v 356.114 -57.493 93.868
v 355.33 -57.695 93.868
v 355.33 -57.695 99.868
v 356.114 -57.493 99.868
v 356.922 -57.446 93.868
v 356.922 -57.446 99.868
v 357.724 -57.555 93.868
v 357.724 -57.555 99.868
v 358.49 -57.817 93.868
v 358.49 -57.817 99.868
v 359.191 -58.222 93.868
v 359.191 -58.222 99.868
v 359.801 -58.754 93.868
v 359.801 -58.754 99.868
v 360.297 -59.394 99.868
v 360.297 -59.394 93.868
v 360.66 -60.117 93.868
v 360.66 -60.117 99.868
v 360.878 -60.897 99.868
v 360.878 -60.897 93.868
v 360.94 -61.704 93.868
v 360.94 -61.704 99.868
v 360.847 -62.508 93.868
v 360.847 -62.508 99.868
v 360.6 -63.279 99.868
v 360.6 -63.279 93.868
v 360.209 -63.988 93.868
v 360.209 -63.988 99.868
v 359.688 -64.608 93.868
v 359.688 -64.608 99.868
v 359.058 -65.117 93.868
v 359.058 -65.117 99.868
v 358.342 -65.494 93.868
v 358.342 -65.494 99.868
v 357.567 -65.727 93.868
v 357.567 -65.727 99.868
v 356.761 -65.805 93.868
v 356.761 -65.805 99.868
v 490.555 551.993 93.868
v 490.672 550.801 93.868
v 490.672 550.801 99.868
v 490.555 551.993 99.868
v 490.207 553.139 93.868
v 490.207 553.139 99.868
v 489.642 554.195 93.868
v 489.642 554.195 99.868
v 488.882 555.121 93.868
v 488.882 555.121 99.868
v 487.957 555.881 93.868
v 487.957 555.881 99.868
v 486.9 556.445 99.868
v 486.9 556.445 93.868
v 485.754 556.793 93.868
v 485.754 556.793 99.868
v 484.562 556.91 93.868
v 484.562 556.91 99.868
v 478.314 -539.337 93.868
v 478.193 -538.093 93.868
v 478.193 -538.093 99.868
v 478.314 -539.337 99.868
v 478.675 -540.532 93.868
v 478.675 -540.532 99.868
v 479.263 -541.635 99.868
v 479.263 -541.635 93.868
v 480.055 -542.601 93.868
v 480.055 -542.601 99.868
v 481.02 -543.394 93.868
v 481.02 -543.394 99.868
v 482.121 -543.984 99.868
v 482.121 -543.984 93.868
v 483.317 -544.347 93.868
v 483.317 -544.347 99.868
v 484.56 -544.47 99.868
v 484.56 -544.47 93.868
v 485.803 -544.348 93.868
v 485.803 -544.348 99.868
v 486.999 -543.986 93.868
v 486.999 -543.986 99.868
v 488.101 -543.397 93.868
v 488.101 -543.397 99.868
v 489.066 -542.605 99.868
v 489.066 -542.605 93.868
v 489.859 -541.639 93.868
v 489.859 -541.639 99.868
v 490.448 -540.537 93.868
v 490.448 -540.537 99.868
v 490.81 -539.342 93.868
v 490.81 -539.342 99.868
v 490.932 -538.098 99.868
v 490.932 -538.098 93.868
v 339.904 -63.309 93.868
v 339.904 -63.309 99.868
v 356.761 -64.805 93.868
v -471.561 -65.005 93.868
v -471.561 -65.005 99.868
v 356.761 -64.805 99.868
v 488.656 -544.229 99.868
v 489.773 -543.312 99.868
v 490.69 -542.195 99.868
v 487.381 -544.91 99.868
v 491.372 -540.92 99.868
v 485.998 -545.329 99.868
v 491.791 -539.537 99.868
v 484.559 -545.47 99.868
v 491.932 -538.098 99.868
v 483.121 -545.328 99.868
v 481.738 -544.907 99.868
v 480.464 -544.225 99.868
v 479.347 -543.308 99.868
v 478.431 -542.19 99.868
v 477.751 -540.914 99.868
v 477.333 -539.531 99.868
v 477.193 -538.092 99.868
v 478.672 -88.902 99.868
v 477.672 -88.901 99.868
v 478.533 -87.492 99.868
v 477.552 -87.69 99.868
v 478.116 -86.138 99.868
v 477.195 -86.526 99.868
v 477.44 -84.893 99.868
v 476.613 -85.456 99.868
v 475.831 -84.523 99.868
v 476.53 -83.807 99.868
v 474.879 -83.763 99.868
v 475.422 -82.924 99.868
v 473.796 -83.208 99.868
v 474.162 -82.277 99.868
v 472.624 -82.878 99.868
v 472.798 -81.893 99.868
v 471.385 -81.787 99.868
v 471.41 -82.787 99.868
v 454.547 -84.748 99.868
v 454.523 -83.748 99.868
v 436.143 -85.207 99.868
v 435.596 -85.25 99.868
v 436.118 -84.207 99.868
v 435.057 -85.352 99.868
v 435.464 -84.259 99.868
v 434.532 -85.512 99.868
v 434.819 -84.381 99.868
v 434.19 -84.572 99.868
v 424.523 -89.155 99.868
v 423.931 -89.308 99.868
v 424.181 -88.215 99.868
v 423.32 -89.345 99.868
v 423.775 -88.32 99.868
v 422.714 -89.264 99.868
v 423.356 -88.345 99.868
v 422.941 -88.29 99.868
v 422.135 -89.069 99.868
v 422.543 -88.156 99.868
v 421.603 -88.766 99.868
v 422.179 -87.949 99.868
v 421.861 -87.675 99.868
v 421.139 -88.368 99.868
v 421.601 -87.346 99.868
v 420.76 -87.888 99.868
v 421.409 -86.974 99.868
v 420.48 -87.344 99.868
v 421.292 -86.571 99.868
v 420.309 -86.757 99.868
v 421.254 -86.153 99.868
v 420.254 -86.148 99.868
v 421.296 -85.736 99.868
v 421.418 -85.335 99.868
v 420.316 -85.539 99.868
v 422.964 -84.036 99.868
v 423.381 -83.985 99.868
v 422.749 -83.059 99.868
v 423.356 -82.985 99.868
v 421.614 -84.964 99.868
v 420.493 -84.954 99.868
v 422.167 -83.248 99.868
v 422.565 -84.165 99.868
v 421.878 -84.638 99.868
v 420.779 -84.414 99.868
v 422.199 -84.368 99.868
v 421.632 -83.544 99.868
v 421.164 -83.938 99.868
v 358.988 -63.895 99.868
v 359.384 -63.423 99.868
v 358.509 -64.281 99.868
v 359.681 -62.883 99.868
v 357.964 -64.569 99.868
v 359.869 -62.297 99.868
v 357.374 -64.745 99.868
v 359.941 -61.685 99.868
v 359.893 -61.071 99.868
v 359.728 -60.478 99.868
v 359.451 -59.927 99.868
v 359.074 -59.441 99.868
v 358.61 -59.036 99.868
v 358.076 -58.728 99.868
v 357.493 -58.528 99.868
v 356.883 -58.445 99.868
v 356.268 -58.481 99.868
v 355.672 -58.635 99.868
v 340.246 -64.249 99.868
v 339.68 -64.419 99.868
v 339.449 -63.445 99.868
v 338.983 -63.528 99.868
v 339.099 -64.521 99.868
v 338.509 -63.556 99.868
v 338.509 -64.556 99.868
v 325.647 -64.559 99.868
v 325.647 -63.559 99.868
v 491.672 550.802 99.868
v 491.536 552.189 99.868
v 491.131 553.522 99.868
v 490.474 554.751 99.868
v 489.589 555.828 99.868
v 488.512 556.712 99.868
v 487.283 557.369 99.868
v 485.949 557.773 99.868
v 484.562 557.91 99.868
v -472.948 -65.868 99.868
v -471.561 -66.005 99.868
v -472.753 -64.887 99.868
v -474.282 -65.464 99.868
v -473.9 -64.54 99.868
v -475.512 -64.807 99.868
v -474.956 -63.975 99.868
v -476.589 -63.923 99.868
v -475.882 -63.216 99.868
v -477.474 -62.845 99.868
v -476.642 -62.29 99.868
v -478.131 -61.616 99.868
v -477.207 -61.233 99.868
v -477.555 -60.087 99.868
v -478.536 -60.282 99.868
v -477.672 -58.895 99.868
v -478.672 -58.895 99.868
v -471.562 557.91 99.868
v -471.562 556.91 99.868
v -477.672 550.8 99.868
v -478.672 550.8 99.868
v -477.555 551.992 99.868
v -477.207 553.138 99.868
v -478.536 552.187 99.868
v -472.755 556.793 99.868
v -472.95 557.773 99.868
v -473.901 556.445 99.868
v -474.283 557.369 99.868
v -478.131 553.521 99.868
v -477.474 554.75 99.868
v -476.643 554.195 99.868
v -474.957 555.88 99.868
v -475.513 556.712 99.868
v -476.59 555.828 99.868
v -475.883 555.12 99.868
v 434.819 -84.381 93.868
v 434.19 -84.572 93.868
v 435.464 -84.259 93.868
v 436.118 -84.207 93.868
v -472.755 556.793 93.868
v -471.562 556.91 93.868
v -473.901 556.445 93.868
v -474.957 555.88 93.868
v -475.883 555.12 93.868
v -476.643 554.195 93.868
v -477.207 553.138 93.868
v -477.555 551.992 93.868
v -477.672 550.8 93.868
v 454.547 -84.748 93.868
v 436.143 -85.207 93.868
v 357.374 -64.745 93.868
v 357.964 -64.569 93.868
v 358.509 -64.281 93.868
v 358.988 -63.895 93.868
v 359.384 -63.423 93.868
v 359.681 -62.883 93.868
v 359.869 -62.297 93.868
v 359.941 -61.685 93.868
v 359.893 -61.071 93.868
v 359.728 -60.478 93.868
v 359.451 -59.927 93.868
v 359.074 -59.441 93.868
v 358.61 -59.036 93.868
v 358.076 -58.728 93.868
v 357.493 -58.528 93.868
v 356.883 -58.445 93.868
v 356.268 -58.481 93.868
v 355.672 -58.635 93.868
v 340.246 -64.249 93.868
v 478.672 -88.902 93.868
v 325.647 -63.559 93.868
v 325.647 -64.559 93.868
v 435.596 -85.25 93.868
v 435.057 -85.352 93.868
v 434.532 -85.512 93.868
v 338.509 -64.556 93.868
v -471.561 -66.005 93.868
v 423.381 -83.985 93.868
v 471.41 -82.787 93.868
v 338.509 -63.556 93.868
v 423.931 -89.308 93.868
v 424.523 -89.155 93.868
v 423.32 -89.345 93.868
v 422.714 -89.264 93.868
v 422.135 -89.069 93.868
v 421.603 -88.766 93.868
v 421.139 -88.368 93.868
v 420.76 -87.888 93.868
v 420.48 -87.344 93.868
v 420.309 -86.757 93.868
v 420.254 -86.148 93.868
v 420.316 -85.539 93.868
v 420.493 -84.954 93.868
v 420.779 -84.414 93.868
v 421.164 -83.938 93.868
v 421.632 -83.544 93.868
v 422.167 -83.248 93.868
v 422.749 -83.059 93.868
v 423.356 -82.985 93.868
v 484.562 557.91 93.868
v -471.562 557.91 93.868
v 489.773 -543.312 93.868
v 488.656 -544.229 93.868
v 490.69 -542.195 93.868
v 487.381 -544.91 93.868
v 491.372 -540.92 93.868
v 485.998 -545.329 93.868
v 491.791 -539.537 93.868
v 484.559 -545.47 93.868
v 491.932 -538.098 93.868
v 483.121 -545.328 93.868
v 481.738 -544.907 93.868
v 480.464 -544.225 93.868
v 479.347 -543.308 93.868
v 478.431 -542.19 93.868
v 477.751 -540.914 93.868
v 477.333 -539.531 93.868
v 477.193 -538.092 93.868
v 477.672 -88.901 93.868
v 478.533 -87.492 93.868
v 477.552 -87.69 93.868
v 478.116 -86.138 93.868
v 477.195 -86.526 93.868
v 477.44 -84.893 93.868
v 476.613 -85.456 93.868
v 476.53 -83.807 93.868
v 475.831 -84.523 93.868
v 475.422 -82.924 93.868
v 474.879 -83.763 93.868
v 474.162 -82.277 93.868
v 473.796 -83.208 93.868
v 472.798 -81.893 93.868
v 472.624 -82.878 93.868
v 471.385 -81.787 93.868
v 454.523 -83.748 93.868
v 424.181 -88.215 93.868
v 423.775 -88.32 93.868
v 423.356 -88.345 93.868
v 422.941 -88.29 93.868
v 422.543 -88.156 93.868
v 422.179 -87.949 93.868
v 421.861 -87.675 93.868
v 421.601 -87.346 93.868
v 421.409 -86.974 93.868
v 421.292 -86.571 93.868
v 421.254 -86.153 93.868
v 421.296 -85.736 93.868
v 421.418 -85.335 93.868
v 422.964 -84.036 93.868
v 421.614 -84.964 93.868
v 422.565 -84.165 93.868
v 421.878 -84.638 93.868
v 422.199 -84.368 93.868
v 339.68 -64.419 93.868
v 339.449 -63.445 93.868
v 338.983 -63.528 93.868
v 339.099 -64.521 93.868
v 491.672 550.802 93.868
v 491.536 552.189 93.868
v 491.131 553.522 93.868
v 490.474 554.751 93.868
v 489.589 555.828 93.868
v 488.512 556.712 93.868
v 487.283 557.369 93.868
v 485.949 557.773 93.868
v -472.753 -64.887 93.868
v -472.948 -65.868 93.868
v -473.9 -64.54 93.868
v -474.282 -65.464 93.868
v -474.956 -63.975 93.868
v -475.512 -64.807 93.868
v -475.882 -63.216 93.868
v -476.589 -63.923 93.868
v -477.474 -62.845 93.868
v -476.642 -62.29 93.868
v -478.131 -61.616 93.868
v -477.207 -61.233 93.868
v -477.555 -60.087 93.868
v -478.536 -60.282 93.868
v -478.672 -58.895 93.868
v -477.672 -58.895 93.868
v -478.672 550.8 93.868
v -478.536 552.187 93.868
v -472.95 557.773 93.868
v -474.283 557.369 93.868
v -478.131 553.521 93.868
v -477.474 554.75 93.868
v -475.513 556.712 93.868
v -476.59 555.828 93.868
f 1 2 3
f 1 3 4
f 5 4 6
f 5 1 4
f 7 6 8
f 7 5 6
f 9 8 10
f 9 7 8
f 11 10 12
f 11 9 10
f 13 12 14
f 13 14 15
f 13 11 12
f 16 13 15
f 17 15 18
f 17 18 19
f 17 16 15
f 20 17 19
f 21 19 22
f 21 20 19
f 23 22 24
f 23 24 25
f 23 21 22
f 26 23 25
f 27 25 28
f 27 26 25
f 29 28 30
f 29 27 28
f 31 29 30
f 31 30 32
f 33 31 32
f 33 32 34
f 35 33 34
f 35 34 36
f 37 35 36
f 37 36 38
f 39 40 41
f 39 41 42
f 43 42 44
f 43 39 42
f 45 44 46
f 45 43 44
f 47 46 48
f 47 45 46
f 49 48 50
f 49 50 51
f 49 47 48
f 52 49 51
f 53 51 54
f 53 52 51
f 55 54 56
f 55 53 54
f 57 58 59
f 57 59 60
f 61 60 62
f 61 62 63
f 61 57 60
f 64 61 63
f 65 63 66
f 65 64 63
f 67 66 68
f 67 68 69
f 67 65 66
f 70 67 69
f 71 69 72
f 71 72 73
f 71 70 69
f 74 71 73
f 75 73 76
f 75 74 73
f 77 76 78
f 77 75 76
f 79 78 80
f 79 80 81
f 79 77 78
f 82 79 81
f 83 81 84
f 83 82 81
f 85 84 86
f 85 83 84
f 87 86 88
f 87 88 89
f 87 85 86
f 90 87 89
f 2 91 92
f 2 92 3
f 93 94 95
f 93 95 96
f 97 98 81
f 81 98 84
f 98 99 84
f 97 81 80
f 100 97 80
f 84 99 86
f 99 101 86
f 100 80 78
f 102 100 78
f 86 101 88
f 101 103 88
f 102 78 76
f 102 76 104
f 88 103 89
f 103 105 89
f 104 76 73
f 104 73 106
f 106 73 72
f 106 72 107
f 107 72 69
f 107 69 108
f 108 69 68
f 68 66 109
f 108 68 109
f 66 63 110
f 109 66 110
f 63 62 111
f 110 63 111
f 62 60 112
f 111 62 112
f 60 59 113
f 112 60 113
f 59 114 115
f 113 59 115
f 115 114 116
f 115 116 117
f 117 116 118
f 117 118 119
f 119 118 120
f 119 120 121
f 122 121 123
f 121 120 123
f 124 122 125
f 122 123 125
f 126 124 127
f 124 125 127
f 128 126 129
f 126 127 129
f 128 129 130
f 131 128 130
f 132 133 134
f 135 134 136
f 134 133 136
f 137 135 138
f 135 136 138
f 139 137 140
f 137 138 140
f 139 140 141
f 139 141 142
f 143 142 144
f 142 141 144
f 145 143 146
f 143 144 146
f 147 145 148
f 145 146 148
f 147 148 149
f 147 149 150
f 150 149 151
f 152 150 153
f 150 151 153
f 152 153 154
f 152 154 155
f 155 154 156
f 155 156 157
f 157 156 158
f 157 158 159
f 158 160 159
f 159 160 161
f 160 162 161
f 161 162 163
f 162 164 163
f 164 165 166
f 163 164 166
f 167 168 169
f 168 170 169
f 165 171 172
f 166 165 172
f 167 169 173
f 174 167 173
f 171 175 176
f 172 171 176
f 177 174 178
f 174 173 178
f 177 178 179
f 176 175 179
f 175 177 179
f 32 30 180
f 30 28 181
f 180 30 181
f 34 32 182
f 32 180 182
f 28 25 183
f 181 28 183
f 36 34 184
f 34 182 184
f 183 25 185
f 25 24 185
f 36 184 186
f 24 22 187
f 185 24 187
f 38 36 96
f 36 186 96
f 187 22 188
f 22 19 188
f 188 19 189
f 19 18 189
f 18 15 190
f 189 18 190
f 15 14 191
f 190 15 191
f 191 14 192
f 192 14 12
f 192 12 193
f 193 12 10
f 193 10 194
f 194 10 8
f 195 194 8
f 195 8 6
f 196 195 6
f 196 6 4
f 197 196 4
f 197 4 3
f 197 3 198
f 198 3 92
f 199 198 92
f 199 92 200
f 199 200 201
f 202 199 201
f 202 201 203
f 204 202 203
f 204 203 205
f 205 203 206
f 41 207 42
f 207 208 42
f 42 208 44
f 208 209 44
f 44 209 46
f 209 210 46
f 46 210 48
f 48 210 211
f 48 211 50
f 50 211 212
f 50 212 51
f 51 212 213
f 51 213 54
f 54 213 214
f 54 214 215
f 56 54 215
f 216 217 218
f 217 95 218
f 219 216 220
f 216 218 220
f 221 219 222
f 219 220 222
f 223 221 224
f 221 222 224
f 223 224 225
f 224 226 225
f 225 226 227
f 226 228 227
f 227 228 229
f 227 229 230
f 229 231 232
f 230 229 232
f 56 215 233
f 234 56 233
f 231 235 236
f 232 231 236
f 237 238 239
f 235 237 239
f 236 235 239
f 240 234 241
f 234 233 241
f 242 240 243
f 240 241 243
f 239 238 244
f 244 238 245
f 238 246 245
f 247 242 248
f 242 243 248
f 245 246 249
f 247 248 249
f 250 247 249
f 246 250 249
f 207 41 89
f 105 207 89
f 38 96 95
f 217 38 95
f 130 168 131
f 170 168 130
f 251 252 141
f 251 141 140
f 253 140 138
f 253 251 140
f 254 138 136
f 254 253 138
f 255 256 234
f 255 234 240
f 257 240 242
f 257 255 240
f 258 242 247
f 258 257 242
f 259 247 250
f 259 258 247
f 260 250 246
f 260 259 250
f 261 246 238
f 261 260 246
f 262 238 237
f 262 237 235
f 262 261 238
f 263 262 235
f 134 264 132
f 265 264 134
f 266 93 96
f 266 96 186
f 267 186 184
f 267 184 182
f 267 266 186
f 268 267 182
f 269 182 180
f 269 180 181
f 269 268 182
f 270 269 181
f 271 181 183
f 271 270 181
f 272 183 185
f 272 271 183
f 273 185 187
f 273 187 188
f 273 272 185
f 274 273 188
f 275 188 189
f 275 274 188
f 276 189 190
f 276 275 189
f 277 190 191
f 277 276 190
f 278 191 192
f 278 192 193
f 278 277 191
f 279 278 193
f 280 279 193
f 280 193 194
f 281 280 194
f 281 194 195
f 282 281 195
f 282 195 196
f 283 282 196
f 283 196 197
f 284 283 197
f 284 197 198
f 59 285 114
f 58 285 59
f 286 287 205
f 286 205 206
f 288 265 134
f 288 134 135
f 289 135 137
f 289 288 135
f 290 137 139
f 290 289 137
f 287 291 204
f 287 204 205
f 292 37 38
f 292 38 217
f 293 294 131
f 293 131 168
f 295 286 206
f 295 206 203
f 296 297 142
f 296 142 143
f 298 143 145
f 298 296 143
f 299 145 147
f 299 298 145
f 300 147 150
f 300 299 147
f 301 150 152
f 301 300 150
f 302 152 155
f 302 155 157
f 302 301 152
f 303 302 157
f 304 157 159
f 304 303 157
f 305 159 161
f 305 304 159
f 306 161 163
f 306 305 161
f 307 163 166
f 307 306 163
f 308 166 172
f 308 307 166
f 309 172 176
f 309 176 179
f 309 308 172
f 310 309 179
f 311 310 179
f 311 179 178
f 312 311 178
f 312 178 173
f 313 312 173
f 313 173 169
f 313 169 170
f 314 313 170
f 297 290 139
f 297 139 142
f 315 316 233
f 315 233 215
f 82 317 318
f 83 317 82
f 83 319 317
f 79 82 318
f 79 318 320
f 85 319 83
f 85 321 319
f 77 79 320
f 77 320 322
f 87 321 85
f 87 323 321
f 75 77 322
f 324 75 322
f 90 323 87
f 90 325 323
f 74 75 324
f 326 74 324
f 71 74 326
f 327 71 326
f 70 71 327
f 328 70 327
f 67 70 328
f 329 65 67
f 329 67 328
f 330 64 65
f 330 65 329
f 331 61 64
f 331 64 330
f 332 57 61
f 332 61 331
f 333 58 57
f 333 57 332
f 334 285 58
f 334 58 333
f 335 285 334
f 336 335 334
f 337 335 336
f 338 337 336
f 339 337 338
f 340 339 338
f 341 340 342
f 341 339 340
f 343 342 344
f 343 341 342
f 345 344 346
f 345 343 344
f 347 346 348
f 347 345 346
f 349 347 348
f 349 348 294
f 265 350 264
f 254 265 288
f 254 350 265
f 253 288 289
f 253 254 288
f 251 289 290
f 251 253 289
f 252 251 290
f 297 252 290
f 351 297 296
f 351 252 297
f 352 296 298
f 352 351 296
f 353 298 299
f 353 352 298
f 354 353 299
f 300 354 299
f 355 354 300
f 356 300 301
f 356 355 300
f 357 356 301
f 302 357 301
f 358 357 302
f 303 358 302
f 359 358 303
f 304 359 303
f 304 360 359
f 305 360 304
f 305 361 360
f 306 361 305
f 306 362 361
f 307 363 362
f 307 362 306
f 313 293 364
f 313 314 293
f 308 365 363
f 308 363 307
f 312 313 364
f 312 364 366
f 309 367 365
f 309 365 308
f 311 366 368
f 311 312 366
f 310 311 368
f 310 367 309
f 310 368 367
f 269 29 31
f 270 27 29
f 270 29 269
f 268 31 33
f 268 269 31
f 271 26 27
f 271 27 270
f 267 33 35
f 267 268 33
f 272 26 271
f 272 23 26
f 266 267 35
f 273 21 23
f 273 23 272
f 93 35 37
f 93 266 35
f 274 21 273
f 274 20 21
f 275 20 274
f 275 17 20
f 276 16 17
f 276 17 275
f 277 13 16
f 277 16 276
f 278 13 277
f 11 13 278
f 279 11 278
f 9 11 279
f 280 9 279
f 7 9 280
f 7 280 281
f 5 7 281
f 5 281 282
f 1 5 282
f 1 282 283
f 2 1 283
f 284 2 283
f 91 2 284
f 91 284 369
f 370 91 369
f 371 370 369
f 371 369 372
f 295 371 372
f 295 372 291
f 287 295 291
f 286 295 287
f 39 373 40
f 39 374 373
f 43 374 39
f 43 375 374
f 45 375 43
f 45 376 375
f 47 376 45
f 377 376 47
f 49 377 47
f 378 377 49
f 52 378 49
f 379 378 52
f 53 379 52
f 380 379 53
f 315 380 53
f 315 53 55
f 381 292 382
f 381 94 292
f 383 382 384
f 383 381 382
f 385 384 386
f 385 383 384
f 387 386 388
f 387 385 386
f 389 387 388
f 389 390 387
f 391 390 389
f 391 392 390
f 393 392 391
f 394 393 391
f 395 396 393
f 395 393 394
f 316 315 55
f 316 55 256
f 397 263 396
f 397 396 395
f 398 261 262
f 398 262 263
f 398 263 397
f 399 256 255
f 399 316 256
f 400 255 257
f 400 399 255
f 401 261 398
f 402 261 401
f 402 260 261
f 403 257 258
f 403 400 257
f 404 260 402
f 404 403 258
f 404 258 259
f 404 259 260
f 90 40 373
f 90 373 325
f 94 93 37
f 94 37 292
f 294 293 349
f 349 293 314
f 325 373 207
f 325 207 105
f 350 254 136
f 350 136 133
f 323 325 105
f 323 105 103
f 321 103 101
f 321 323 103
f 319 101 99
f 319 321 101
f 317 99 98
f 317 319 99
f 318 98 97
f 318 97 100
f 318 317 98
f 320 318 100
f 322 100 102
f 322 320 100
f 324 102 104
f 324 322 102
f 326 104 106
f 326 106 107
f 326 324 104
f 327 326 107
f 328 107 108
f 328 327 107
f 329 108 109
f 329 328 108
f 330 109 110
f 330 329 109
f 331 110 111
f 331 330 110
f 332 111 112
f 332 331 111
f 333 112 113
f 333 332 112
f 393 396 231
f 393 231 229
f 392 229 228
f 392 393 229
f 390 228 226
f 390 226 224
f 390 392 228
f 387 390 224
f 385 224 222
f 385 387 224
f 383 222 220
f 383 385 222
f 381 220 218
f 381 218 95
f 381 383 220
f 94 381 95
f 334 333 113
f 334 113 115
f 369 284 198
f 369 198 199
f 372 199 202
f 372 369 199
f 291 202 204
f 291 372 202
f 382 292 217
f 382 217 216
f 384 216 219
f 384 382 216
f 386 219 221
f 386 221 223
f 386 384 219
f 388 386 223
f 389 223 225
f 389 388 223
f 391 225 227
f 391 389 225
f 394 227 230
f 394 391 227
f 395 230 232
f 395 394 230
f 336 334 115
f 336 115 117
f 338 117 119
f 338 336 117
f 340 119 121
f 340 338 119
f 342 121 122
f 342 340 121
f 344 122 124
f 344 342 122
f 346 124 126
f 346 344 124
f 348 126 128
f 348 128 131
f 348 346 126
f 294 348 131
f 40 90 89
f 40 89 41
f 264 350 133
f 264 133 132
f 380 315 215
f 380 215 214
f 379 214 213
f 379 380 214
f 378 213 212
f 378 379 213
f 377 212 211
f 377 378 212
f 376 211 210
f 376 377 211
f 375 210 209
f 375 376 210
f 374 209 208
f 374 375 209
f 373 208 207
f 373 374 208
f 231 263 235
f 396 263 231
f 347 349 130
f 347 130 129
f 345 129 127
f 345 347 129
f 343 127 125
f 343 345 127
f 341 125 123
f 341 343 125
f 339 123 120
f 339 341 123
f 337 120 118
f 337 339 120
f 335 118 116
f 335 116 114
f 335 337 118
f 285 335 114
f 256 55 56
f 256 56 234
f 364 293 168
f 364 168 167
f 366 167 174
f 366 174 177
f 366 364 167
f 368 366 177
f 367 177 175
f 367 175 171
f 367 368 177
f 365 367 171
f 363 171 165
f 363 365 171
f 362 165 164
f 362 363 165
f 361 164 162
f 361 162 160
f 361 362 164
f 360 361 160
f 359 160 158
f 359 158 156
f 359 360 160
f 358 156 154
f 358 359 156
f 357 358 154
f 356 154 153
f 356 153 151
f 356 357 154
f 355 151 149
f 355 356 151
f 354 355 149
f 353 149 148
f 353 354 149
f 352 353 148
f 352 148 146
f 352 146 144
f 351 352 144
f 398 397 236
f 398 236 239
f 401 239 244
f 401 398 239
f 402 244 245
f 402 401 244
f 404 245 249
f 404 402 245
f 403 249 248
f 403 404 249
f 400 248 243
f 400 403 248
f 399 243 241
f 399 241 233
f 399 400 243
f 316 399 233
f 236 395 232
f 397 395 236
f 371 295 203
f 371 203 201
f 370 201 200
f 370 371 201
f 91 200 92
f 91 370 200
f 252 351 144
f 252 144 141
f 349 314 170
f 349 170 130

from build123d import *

# Parameters (mm, degrees)
EXTRUDE_THIN4_DEPTH = 6


with BuildPart() as part:
    # Sketch1 → Extrude-Thin4 (new body)
    with BuildSketch(Plane.XY.offset(93.86849497)):
        with BuildLine():
            Line((454.547451712, -84.747722447), (436.143146619, -85.206883154))
            ThreePointArc((436.143146619, -85.206883154), (435.325389653, -85.293870004), (434.532383495, -85.511664405))
            Line((434.532383495, -85.511664405), (424.523003293, -89.154780862))
            ThreePointArc((424.523003293, -89.154780862), (420.309165105, -86.756830797), (423.355608829, -82.985123303))
            Line((423.355608829, -82.985123303), (471.385170996, -81.786855419))
            ThreePointArc((471.385170996, -81.786855419), (476.52965679, -83.807458497), (478.672495941, -88.902241246))
            Line((478.672495941, -88.902241246), (478.192503637, -538.093193208))
            ThreePointArc((478.192503637, -538.093193208), (484.559857096, -544.469999452), (490.932499818, -538.098479016))
            Line((490.932499818, -538.098479016), (490.672499826, 550.801458903))
            ThreePointArc((490.672499826, 550.801458903), (488.882406602, 555.120938203), (484.5625, 556.91))
            Line((484.5625, 556.91), (-471.5625, 556.91))
            ThreePointArc((-471.5625, 556.91), (-475.882922433, 555.120422433), (-477.6725, 550.8))
            Line((-477.6725, 550.8), (-477.6725, -58.894643712))
            ThreePointArc((-477.6725, -58.894643712), (-475.882402145, -63.215586371), (-471.56102849, -65.004643535))
            Line((-471.56102849, -65.004643535), (356.760717872, -64.80515362))
            ThreePointArc((356.760717872, -64.80515362), (359.892804832, -61.071108191), (355.671900131, -58.634506563))
            Line((355.671900131, -58.634506563), (340.245690102, -64.249187841))
            ThreePointArc((340.245690102, -64.249187841), (339.390962941, -64.478266451), (338.509451222, -64.55554918))
            Line((338.509451222, -64.55554918), (325.647451712, -64.558646816))
            Line((325.647451712, -64.558646816), (325.647210875, -63.558646845))
            Line((325.647210875, -63.558646845), (338.509210386, -63.555549209))
            ThreePointArc((338.509210386, -63.555549209), (339.217196175, -63.493479616), (339.903669959, -63.30949522))
            Line((339.903669959, -63.30949522), (355.329879987, -57.694813942))
            ThreePointArc((355.329879987, -57.694813942), (360.877591668, -60.897341426), (356.760958708, -65.805153591))
            Line((356.760958708, -65.805153591), (-471.560787654, -66.004643506))
            ThreePointArc((-471.560787654, -66.004643506), (-476.589423772, -63.922778296), (-478.6725, -58.894643712))
            Line((-478.6725, -58.894643712), (-478.6725, 550.8))
            ThreePointArc((-478.6725, 550.8), (-476.590029214, 555.827529214), (-471.5625, 557.91))
            Line((-471.5625, 557.91), (484.5625, 557.91))
            ThreePointArc((484.5625, 557.91), (489.589428959, 555.828129398), (491.672499797, 550.801697677))
            Line((491.672499797, 550.801697677), (491.93249979, -538.098240242))
            ThreePointArc((491.93249979, -538.098240242), (484.559442197, -545.469999366), (477.192504208, -538.092124638))
            Line((477.192504208, -538.092124638), (477.672496512, -88.901172676))
            ThreePointArc((477.672496512, -88.901172676), (475.831041208, -84.522955714), (471.410111784, -82.786544349))
            Line((471.410111784, -82.786544349), (423.380549617, -83.984812234))
            ThreePointArc((423.380549617, -83.984812234), (421.29173064, -86.570914228), (424.180983149, -88.215088242))
            Line((424.180983149, -88.215088242), (434.190363351, -84.571971785))
            ThreePointArc((434.190363351, -84.571971785), (435.139473084, -84.31130447), (436.11820583, -84.207194224))
            Line((436.11820583, -84.207194224), (454.522510923, -83.748033516))
            Line((454.522510923, -83.748033516), (454.547451712, -84.747722447))
        make_face()
    extrude(amount=EXTRUDE_THIN4_DEPTH)


solid = part.part
